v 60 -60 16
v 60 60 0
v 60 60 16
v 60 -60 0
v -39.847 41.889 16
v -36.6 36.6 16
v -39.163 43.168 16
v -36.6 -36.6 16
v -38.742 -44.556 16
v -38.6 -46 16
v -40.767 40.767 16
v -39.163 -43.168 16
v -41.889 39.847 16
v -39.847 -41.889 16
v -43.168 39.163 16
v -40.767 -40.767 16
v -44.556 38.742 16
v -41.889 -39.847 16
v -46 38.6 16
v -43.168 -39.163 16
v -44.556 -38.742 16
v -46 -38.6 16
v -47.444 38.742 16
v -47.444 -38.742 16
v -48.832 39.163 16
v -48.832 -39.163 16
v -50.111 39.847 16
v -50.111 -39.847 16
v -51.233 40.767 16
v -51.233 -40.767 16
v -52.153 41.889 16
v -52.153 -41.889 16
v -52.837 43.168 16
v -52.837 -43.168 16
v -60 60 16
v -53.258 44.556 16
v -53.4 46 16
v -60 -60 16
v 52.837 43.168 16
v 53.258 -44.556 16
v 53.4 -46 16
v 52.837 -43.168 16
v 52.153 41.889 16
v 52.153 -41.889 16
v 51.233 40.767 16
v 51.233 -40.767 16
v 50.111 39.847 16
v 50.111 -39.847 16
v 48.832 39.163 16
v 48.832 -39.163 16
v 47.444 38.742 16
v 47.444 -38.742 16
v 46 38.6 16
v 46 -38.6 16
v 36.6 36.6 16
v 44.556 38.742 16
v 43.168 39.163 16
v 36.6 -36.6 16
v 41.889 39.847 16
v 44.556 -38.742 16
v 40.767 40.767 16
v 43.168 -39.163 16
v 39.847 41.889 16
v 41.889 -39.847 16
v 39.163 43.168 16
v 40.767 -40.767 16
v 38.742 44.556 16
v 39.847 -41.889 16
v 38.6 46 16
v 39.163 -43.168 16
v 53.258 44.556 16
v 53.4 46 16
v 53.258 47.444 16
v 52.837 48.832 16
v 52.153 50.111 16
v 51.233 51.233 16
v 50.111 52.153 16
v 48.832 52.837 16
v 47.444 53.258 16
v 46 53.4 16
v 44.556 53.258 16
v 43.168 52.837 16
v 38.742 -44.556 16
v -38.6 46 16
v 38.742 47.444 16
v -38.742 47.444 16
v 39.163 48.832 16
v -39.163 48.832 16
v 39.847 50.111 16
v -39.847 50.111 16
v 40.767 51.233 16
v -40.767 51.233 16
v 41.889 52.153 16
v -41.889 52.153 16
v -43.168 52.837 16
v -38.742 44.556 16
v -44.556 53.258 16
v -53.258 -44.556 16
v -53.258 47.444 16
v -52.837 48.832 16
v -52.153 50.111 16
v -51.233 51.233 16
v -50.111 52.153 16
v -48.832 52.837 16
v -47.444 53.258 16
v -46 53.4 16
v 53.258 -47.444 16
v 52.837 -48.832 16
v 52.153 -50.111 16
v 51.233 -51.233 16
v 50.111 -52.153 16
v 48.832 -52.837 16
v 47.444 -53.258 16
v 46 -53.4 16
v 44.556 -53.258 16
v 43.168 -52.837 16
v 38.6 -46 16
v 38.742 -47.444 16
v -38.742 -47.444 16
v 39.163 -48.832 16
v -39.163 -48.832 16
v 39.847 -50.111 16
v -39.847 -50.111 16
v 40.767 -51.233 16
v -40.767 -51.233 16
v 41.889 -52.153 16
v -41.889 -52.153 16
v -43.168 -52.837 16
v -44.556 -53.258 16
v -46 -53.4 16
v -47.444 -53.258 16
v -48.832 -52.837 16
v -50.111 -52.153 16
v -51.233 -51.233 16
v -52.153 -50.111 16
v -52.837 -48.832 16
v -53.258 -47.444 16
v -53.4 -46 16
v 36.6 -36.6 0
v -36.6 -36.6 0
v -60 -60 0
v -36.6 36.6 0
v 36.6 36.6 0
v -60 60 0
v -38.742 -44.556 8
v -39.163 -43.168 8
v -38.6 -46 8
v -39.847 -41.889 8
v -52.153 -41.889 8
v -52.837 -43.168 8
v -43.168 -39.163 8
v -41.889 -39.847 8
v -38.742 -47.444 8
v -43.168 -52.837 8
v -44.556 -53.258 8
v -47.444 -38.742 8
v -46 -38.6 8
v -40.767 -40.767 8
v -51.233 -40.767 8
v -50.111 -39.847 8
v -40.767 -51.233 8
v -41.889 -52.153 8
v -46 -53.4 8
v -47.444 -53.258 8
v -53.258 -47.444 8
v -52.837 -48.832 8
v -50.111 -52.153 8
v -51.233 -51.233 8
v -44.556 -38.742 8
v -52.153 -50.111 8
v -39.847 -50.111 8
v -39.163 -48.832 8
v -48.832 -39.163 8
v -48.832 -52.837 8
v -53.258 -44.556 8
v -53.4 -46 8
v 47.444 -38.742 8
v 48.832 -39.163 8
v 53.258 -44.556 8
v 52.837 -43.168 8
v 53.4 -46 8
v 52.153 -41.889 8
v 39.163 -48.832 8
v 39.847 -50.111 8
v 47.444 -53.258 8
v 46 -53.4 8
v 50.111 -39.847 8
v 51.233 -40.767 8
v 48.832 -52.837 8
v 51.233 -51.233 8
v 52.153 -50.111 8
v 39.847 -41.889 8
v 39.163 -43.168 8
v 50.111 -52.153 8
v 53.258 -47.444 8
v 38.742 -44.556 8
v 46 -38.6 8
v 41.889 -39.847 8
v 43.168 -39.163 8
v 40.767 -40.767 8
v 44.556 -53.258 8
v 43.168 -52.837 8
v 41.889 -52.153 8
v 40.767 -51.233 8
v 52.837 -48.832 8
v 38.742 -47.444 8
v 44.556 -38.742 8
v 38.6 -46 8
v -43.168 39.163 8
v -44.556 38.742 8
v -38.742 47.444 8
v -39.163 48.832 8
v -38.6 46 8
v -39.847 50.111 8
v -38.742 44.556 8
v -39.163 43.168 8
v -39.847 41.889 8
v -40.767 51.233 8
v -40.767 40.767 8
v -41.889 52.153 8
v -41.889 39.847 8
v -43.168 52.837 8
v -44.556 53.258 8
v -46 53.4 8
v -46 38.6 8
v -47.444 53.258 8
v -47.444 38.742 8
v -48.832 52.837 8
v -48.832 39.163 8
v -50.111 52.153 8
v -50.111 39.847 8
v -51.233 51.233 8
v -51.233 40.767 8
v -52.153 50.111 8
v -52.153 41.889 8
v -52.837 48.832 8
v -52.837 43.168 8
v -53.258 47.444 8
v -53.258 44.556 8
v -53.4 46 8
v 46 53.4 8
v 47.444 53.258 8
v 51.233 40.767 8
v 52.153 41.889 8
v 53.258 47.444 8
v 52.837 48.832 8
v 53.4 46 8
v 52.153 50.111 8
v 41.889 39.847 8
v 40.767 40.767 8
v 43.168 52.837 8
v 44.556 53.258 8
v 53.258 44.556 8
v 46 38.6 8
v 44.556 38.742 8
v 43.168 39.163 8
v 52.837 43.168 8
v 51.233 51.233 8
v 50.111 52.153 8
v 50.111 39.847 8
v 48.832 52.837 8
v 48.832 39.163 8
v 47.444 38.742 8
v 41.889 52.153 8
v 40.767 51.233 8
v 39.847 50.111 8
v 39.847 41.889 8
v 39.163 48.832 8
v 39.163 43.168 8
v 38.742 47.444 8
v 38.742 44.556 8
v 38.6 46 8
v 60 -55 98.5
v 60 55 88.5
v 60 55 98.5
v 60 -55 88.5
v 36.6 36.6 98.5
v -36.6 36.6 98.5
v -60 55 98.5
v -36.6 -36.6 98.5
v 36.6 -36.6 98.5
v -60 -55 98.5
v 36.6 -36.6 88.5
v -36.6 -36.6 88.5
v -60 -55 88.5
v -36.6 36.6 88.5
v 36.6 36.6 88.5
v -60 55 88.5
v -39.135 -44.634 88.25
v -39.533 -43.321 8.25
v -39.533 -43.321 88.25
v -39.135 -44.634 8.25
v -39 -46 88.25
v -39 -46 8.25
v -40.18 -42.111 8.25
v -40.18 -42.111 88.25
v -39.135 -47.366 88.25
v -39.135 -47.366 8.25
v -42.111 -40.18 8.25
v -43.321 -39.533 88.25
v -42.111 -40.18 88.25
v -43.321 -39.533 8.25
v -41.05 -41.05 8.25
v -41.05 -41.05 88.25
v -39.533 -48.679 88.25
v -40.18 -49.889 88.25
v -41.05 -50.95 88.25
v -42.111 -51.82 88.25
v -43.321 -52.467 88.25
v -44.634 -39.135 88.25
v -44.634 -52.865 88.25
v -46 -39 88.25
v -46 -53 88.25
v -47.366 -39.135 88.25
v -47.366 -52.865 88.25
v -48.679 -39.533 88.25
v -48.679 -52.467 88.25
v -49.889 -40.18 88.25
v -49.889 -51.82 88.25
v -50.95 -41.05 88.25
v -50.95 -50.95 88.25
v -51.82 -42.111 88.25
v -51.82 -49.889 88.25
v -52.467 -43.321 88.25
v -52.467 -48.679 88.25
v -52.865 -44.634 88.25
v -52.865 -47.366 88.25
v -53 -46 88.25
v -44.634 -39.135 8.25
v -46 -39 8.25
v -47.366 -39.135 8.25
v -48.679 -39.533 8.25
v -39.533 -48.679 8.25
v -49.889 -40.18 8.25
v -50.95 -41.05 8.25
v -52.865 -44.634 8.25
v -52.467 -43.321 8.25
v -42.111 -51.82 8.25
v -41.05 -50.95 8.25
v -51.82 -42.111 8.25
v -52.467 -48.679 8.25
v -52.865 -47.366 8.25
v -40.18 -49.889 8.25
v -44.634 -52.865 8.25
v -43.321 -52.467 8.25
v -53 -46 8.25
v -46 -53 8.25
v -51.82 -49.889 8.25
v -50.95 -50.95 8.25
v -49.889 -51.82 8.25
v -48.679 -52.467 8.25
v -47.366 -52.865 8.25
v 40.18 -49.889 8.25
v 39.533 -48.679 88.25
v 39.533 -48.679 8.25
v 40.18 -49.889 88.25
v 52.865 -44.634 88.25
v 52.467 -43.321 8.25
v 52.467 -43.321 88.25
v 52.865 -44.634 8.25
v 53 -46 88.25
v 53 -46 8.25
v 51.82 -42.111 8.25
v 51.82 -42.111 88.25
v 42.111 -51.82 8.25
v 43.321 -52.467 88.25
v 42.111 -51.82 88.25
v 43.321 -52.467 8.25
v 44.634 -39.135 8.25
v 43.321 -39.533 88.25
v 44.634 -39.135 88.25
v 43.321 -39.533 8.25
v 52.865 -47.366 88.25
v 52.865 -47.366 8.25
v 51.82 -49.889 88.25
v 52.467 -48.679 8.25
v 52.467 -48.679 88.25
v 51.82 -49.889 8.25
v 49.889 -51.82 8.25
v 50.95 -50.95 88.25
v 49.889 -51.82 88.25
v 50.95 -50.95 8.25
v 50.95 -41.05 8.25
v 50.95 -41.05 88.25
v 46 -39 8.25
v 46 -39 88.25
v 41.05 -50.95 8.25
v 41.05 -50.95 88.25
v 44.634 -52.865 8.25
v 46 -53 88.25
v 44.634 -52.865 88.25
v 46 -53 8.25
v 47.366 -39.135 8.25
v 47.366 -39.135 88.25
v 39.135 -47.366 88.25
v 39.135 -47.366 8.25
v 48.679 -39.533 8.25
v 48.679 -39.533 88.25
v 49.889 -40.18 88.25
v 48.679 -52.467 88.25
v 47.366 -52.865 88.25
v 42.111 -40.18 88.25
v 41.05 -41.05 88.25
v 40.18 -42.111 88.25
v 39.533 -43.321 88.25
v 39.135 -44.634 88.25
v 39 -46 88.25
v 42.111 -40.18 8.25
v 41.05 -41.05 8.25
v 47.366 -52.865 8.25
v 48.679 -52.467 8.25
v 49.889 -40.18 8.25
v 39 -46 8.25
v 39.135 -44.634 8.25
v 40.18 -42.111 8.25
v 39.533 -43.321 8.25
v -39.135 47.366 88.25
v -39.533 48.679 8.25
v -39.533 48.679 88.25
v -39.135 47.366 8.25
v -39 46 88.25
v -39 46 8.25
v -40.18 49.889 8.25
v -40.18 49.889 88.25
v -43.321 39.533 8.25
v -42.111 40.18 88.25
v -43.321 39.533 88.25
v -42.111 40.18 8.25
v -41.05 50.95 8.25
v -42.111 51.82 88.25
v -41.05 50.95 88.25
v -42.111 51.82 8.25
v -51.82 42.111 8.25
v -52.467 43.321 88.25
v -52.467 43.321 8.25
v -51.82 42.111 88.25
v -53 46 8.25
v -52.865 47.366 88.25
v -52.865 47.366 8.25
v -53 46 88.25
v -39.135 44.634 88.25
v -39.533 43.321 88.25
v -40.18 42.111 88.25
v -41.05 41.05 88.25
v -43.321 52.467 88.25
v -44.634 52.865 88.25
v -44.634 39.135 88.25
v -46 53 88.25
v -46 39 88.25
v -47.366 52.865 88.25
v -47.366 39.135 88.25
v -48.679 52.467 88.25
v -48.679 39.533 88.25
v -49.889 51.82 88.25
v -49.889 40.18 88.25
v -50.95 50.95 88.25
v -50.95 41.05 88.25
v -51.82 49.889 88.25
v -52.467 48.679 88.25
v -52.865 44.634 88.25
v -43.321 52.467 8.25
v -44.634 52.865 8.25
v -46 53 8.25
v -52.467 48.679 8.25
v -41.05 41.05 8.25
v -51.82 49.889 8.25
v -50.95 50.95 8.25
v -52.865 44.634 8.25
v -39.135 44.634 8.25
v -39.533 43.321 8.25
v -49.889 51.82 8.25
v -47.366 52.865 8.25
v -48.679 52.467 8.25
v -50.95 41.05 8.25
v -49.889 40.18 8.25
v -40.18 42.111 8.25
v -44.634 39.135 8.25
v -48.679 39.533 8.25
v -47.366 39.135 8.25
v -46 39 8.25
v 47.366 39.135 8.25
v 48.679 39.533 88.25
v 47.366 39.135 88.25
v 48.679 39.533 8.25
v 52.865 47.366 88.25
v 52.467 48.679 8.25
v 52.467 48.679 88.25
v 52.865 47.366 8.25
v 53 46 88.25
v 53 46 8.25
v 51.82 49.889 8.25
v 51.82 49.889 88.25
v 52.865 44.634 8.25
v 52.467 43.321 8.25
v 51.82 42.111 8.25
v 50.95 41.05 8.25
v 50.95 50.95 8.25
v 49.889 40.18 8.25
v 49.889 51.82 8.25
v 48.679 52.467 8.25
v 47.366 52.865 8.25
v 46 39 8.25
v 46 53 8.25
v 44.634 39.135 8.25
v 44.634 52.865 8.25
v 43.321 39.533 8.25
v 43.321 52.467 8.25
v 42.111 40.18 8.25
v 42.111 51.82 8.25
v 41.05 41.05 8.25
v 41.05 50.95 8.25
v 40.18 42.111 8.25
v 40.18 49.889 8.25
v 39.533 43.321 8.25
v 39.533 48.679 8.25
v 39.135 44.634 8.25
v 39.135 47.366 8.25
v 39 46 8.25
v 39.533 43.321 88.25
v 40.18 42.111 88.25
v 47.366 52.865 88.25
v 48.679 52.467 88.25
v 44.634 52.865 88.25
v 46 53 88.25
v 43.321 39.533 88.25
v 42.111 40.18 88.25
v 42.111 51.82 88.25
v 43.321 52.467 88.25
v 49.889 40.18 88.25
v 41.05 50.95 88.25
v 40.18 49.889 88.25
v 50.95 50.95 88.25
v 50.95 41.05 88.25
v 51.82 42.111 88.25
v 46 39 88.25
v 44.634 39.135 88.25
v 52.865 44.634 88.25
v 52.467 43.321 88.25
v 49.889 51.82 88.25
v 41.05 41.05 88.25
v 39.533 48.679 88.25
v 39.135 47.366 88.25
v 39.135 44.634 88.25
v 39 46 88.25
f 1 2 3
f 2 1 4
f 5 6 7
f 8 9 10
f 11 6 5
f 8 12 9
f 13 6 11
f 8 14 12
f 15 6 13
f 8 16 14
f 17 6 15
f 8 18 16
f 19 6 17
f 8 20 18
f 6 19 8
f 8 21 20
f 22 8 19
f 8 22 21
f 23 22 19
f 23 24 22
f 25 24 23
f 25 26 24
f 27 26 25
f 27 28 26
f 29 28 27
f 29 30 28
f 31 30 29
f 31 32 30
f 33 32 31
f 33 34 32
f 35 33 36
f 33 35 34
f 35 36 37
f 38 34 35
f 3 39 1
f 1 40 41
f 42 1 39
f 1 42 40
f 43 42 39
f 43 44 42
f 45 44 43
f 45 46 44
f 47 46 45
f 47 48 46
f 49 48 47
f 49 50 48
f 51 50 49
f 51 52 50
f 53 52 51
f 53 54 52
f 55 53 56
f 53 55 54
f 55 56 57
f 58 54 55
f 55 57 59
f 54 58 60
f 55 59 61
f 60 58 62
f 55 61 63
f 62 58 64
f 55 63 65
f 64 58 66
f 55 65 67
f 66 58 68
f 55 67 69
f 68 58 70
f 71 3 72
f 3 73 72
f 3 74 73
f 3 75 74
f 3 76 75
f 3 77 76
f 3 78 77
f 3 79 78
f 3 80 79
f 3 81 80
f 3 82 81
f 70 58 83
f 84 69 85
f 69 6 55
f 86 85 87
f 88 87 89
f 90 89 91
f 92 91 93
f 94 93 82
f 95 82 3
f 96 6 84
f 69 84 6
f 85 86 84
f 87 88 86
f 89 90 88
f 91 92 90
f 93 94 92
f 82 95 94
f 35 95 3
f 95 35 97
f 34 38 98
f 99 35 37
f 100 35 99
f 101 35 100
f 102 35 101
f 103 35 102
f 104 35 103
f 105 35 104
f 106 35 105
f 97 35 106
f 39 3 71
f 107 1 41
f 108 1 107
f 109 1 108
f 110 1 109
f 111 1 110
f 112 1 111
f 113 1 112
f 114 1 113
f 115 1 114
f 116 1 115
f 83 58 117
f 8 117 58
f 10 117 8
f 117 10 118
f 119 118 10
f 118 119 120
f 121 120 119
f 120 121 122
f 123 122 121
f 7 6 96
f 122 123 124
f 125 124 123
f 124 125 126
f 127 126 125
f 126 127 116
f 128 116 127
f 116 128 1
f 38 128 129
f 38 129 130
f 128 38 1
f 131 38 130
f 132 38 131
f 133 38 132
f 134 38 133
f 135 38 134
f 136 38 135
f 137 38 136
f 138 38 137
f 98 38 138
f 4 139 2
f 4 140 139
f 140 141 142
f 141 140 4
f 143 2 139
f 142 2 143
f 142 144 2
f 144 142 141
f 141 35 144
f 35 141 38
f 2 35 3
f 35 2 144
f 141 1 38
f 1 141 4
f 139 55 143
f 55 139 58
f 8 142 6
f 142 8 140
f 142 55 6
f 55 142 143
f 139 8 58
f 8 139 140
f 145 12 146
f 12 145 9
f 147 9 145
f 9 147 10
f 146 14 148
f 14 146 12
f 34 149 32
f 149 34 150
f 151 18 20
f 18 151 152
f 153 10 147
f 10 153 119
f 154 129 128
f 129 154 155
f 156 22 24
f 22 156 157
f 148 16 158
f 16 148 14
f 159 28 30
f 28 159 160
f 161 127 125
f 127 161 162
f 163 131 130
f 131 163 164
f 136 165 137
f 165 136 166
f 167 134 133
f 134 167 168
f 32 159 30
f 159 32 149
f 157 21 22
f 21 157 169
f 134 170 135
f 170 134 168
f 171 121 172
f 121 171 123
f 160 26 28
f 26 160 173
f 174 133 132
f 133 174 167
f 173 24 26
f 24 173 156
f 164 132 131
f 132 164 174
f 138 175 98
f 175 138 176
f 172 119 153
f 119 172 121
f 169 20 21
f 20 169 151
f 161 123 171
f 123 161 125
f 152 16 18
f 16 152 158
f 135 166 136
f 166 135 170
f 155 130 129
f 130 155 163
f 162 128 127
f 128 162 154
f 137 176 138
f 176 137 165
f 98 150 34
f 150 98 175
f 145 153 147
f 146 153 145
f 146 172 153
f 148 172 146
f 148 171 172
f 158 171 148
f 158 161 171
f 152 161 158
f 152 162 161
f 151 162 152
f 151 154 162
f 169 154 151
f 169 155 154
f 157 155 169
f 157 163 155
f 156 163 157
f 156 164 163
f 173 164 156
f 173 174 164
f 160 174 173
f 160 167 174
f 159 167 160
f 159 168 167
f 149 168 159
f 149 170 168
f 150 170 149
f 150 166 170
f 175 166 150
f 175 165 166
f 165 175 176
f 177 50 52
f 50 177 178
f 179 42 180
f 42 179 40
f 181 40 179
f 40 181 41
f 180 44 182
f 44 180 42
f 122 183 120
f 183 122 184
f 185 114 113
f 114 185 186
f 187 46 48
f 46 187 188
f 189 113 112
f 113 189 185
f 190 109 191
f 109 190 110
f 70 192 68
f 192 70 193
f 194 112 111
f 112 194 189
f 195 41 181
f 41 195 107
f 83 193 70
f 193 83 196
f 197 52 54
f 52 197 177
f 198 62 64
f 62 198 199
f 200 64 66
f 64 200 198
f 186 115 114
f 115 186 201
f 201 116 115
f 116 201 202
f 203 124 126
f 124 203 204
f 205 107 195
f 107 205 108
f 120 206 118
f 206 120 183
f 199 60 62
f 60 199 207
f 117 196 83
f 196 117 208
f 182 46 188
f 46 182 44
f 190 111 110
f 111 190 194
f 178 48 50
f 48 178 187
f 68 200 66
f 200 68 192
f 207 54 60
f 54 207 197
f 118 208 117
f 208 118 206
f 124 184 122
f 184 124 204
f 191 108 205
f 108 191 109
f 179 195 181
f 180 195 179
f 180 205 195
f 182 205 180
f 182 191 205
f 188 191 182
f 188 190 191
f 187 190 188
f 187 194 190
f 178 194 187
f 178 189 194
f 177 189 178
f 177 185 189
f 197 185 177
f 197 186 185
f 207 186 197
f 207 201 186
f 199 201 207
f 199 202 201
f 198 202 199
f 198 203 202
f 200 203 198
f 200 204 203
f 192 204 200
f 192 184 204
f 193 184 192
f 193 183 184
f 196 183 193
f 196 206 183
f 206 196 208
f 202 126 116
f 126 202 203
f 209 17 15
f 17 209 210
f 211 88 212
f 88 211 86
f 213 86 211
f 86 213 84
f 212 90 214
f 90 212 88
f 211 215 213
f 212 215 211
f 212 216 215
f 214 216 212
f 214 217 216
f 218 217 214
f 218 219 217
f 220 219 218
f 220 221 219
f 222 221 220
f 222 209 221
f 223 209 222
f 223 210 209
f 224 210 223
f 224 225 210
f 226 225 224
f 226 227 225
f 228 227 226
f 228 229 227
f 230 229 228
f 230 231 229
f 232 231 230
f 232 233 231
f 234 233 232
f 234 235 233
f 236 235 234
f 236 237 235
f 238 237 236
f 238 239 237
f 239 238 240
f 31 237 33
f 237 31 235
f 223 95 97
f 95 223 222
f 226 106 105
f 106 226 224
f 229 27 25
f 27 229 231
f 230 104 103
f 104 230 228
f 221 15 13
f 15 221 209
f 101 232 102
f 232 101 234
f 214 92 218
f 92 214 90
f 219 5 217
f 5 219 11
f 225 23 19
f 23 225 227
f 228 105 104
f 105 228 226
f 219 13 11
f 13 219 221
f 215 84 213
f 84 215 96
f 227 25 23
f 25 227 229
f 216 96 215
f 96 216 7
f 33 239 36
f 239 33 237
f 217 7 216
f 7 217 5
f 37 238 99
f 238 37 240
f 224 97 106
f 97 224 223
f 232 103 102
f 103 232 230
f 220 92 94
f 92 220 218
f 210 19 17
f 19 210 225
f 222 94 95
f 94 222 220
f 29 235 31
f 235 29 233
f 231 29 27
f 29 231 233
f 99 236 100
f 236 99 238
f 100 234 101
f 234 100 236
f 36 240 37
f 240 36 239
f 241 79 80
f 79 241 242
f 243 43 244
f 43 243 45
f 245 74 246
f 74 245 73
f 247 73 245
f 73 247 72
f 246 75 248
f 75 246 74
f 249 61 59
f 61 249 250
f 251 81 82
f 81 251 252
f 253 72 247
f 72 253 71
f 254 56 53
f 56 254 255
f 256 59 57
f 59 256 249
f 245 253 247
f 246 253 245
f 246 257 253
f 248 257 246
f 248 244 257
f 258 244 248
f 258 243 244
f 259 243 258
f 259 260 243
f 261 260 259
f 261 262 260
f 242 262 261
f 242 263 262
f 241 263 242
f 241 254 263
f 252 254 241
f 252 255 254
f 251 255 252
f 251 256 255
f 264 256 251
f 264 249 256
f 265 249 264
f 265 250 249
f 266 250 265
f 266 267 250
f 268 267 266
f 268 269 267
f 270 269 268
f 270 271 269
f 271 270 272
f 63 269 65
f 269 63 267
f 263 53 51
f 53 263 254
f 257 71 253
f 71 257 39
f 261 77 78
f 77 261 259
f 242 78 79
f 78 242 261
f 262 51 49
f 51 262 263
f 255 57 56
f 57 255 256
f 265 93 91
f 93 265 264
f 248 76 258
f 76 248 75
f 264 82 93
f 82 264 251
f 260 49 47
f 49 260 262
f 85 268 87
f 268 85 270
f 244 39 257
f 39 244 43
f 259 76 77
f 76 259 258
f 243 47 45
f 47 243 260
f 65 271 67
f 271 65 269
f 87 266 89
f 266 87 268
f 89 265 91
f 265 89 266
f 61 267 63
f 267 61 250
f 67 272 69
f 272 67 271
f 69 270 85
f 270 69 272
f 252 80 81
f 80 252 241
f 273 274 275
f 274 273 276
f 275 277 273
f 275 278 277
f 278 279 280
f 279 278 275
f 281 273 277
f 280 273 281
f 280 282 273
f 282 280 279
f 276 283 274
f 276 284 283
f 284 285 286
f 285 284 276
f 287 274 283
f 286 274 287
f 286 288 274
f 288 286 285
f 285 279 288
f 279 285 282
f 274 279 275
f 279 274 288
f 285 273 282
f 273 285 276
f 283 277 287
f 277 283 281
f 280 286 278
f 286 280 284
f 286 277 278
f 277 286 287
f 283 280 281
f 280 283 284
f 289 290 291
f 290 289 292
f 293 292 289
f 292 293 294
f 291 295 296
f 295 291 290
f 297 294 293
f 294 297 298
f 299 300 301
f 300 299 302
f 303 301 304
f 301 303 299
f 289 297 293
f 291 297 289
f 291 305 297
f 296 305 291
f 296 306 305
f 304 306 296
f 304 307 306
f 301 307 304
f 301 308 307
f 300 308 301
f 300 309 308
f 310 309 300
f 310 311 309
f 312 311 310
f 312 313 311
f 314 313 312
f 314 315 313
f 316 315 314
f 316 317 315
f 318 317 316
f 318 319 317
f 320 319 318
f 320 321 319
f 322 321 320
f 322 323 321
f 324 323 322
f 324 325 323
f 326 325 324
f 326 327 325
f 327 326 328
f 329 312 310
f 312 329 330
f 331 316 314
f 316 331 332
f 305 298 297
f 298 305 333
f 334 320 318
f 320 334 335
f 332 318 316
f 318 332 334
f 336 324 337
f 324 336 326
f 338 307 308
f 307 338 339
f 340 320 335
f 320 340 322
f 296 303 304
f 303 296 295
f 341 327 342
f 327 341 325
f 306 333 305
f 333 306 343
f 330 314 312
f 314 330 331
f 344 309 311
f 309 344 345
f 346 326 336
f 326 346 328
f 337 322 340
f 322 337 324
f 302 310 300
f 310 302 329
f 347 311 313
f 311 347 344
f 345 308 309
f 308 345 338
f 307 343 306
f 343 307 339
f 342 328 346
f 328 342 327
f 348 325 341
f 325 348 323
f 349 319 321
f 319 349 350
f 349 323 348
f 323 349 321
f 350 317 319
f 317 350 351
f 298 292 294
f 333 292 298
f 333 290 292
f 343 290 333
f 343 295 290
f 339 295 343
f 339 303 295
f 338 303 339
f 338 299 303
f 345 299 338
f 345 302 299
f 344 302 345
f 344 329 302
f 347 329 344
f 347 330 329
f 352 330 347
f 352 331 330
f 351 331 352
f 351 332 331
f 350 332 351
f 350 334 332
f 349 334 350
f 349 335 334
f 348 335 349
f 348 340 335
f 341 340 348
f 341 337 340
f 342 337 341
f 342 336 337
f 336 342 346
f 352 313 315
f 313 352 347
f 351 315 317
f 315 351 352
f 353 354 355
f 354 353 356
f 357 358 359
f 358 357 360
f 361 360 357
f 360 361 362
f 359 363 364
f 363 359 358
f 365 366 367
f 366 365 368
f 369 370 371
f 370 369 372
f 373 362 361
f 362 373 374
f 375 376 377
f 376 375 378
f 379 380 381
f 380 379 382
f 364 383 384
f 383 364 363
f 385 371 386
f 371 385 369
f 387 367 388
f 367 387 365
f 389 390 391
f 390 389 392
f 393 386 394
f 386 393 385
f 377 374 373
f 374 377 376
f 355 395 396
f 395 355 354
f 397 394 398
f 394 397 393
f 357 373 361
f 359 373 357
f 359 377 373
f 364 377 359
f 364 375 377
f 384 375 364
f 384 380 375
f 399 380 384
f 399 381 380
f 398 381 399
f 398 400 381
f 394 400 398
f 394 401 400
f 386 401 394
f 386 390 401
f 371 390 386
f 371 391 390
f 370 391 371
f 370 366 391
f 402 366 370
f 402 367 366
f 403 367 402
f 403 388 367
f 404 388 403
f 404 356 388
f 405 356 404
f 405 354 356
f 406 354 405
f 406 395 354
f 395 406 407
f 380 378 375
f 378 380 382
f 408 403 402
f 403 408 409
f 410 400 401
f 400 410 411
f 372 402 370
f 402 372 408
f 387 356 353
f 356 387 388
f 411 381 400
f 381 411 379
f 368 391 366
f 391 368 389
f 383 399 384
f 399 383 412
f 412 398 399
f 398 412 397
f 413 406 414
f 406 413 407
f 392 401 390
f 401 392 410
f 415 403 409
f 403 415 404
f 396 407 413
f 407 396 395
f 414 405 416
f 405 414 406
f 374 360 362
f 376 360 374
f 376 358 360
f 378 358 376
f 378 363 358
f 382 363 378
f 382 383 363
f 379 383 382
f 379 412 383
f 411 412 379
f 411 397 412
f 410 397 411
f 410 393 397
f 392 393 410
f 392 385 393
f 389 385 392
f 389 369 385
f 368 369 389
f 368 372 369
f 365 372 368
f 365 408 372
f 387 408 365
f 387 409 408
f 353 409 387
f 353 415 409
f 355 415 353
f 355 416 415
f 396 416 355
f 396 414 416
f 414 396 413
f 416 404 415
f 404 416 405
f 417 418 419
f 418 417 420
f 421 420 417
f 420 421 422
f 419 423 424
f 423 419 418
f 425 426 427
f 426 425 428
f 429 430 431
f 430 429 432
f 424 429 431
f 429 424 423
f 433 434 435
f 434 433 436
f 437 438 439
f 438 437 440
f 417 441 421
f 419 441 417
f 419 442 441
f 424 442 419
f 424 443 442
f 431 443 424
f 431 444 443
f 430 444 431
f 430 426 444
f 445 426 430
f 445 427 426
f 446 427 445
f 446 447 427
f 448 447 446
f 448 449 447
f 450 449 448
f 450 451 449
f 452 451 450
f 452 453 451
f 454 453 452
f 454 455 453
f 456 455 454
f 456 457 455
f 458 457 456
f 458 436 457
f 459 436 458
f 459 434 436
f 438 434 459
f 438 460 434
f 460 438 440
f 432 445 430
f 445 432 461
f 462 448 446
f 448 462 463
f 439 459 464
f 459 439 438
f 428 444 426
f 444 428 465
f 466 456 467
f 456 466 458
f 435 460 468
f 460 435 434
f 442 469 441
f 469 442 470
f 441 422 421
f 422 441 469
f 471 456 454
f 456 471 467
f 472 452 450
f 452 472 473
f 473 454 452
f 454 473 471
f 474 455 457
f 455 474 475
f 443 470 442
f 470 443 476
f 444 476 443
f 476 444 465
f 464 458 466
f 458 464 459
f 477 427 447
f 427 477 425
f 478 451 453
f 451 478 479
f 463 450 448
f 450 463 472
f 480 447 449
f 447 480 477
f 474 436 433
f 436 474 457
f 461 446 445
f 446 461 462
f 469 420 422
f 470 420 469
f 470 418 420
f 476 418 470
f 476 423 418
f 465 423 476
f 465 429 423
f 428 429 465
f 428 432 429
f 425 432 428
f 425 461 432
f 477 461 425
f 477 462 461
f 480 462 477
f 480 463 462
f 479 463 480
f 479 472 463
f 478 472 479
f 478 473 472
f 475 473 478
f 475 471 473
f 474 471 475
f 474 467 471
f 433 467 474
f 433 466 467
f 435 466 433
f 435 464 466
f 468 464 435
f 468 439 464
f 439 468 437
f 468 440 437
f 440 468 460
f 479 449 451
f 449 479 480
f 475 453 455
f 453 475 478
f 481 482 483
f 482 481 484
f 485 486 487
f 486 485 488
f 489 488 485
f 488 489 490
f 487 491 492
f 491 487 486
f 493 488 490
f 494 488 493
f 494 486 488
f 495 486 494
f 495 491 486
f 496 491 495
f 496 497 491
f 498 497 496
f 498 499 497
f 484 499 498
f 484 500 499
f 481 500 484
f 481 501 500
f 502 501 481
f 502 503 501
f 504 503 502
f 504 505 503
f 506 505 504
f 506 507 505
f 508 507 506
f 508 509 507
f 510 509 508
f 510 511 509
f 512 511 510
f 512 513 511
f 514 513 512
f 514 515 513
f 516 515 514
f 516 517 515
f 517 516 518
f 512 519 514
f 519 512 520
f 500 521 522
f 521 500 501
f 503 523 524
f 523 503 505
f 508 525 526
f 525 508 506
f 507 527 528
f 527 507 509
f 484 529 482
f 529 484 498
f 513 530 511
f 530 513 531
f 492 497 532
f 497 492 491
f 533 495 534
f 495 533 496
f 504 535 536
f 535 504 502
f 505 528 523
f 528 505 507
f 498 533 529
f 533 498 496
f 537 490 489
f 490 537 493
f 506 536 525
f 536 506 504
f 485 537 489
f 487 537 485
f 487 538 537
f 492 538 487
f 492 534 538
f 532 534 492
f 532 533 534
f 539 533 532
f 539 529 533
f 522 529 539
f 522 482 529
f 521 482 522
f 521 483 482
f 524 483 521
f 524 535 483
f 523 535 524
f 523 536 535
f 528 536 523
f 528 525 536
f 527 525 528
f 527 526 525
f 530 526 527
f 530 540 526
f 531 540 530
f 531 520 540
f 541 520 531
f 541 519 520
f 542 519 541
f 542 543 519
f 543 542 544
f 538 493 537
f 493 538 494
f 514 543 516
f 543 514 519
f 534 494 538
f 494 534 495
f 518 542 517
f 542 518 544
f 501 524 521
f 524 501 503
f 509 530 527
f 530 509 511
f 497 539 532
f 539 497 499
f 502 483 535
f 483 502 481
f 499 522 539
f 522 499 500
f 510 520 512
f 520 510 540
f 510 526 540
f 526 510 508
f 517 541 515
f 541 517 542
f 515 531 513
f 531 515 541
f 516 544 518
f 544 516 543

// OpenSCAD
$fn = 32;

// ------------------------------------------------------------------------
// Frame cube: base 120 x 120 mm, posts 80 mm tall
// Every part is its own module, assembly() places every instance.
// ------------------------------------------------------------------------

// --- part 1 ---
module base_frame() {
  difference() {
    translate([-60, -60, 0]) cube([120, 120, 16]);
    translate([-36.6, -36.6, -1]) cube([73.2, 73.2, 18]);
    translate([-46, -46, 8]) cylinder(h = 9, d = 14.8);
    translate([46, -46, 8]) cylinder(h = 9, d = 14.8);
    translate([-46, 46, 8]) cylinder(h = 9, d = 14.8);
    translate([46, 46, 8]) cylinder(h = 9, d = 14.8);
  }
}

// --- part 2 ---
module corner_post() {
  cylinder(h = 80, d = 14);
}

// --- part 3 ---
module top_frame() {
  difference() {
    translate([-60, -55, 0]) cube([120, 110, 10]);
    translate([-36.6, -36.6, -1]) cube([73.2, 73.2, 12]);
  }
}

// --- assembly ---
module assembly() {
  color([0.80, 0.24, 0.20]) translate([0, 0, 0]) rotate([0, 0, 0]) base_frame();
  color([0.20, 0.45, 0.75]) translate([-46, -46, 8.25]) rotate([0, 0, 0]) corner_post();
  color([0.25, 0.62, 0.32]) translate([46, -46, 8.25]) rotate([0, 0, 0]) corner_post();
  color([0.92, 0.70, 0.18]) translate([-46, 46, 8.25]) rotate([0, 0, 0]) corner_post();
  color([0.58, 0.35, 0.70]) translate([46, 46, 8.25]) rotate([0, 0, 0]) corner_post();
  color([0.16, 0.66, 0.66]) translate([0, 0, 88.5]) rotate([0, 0, 0]) top_frame();
}

assembly();
